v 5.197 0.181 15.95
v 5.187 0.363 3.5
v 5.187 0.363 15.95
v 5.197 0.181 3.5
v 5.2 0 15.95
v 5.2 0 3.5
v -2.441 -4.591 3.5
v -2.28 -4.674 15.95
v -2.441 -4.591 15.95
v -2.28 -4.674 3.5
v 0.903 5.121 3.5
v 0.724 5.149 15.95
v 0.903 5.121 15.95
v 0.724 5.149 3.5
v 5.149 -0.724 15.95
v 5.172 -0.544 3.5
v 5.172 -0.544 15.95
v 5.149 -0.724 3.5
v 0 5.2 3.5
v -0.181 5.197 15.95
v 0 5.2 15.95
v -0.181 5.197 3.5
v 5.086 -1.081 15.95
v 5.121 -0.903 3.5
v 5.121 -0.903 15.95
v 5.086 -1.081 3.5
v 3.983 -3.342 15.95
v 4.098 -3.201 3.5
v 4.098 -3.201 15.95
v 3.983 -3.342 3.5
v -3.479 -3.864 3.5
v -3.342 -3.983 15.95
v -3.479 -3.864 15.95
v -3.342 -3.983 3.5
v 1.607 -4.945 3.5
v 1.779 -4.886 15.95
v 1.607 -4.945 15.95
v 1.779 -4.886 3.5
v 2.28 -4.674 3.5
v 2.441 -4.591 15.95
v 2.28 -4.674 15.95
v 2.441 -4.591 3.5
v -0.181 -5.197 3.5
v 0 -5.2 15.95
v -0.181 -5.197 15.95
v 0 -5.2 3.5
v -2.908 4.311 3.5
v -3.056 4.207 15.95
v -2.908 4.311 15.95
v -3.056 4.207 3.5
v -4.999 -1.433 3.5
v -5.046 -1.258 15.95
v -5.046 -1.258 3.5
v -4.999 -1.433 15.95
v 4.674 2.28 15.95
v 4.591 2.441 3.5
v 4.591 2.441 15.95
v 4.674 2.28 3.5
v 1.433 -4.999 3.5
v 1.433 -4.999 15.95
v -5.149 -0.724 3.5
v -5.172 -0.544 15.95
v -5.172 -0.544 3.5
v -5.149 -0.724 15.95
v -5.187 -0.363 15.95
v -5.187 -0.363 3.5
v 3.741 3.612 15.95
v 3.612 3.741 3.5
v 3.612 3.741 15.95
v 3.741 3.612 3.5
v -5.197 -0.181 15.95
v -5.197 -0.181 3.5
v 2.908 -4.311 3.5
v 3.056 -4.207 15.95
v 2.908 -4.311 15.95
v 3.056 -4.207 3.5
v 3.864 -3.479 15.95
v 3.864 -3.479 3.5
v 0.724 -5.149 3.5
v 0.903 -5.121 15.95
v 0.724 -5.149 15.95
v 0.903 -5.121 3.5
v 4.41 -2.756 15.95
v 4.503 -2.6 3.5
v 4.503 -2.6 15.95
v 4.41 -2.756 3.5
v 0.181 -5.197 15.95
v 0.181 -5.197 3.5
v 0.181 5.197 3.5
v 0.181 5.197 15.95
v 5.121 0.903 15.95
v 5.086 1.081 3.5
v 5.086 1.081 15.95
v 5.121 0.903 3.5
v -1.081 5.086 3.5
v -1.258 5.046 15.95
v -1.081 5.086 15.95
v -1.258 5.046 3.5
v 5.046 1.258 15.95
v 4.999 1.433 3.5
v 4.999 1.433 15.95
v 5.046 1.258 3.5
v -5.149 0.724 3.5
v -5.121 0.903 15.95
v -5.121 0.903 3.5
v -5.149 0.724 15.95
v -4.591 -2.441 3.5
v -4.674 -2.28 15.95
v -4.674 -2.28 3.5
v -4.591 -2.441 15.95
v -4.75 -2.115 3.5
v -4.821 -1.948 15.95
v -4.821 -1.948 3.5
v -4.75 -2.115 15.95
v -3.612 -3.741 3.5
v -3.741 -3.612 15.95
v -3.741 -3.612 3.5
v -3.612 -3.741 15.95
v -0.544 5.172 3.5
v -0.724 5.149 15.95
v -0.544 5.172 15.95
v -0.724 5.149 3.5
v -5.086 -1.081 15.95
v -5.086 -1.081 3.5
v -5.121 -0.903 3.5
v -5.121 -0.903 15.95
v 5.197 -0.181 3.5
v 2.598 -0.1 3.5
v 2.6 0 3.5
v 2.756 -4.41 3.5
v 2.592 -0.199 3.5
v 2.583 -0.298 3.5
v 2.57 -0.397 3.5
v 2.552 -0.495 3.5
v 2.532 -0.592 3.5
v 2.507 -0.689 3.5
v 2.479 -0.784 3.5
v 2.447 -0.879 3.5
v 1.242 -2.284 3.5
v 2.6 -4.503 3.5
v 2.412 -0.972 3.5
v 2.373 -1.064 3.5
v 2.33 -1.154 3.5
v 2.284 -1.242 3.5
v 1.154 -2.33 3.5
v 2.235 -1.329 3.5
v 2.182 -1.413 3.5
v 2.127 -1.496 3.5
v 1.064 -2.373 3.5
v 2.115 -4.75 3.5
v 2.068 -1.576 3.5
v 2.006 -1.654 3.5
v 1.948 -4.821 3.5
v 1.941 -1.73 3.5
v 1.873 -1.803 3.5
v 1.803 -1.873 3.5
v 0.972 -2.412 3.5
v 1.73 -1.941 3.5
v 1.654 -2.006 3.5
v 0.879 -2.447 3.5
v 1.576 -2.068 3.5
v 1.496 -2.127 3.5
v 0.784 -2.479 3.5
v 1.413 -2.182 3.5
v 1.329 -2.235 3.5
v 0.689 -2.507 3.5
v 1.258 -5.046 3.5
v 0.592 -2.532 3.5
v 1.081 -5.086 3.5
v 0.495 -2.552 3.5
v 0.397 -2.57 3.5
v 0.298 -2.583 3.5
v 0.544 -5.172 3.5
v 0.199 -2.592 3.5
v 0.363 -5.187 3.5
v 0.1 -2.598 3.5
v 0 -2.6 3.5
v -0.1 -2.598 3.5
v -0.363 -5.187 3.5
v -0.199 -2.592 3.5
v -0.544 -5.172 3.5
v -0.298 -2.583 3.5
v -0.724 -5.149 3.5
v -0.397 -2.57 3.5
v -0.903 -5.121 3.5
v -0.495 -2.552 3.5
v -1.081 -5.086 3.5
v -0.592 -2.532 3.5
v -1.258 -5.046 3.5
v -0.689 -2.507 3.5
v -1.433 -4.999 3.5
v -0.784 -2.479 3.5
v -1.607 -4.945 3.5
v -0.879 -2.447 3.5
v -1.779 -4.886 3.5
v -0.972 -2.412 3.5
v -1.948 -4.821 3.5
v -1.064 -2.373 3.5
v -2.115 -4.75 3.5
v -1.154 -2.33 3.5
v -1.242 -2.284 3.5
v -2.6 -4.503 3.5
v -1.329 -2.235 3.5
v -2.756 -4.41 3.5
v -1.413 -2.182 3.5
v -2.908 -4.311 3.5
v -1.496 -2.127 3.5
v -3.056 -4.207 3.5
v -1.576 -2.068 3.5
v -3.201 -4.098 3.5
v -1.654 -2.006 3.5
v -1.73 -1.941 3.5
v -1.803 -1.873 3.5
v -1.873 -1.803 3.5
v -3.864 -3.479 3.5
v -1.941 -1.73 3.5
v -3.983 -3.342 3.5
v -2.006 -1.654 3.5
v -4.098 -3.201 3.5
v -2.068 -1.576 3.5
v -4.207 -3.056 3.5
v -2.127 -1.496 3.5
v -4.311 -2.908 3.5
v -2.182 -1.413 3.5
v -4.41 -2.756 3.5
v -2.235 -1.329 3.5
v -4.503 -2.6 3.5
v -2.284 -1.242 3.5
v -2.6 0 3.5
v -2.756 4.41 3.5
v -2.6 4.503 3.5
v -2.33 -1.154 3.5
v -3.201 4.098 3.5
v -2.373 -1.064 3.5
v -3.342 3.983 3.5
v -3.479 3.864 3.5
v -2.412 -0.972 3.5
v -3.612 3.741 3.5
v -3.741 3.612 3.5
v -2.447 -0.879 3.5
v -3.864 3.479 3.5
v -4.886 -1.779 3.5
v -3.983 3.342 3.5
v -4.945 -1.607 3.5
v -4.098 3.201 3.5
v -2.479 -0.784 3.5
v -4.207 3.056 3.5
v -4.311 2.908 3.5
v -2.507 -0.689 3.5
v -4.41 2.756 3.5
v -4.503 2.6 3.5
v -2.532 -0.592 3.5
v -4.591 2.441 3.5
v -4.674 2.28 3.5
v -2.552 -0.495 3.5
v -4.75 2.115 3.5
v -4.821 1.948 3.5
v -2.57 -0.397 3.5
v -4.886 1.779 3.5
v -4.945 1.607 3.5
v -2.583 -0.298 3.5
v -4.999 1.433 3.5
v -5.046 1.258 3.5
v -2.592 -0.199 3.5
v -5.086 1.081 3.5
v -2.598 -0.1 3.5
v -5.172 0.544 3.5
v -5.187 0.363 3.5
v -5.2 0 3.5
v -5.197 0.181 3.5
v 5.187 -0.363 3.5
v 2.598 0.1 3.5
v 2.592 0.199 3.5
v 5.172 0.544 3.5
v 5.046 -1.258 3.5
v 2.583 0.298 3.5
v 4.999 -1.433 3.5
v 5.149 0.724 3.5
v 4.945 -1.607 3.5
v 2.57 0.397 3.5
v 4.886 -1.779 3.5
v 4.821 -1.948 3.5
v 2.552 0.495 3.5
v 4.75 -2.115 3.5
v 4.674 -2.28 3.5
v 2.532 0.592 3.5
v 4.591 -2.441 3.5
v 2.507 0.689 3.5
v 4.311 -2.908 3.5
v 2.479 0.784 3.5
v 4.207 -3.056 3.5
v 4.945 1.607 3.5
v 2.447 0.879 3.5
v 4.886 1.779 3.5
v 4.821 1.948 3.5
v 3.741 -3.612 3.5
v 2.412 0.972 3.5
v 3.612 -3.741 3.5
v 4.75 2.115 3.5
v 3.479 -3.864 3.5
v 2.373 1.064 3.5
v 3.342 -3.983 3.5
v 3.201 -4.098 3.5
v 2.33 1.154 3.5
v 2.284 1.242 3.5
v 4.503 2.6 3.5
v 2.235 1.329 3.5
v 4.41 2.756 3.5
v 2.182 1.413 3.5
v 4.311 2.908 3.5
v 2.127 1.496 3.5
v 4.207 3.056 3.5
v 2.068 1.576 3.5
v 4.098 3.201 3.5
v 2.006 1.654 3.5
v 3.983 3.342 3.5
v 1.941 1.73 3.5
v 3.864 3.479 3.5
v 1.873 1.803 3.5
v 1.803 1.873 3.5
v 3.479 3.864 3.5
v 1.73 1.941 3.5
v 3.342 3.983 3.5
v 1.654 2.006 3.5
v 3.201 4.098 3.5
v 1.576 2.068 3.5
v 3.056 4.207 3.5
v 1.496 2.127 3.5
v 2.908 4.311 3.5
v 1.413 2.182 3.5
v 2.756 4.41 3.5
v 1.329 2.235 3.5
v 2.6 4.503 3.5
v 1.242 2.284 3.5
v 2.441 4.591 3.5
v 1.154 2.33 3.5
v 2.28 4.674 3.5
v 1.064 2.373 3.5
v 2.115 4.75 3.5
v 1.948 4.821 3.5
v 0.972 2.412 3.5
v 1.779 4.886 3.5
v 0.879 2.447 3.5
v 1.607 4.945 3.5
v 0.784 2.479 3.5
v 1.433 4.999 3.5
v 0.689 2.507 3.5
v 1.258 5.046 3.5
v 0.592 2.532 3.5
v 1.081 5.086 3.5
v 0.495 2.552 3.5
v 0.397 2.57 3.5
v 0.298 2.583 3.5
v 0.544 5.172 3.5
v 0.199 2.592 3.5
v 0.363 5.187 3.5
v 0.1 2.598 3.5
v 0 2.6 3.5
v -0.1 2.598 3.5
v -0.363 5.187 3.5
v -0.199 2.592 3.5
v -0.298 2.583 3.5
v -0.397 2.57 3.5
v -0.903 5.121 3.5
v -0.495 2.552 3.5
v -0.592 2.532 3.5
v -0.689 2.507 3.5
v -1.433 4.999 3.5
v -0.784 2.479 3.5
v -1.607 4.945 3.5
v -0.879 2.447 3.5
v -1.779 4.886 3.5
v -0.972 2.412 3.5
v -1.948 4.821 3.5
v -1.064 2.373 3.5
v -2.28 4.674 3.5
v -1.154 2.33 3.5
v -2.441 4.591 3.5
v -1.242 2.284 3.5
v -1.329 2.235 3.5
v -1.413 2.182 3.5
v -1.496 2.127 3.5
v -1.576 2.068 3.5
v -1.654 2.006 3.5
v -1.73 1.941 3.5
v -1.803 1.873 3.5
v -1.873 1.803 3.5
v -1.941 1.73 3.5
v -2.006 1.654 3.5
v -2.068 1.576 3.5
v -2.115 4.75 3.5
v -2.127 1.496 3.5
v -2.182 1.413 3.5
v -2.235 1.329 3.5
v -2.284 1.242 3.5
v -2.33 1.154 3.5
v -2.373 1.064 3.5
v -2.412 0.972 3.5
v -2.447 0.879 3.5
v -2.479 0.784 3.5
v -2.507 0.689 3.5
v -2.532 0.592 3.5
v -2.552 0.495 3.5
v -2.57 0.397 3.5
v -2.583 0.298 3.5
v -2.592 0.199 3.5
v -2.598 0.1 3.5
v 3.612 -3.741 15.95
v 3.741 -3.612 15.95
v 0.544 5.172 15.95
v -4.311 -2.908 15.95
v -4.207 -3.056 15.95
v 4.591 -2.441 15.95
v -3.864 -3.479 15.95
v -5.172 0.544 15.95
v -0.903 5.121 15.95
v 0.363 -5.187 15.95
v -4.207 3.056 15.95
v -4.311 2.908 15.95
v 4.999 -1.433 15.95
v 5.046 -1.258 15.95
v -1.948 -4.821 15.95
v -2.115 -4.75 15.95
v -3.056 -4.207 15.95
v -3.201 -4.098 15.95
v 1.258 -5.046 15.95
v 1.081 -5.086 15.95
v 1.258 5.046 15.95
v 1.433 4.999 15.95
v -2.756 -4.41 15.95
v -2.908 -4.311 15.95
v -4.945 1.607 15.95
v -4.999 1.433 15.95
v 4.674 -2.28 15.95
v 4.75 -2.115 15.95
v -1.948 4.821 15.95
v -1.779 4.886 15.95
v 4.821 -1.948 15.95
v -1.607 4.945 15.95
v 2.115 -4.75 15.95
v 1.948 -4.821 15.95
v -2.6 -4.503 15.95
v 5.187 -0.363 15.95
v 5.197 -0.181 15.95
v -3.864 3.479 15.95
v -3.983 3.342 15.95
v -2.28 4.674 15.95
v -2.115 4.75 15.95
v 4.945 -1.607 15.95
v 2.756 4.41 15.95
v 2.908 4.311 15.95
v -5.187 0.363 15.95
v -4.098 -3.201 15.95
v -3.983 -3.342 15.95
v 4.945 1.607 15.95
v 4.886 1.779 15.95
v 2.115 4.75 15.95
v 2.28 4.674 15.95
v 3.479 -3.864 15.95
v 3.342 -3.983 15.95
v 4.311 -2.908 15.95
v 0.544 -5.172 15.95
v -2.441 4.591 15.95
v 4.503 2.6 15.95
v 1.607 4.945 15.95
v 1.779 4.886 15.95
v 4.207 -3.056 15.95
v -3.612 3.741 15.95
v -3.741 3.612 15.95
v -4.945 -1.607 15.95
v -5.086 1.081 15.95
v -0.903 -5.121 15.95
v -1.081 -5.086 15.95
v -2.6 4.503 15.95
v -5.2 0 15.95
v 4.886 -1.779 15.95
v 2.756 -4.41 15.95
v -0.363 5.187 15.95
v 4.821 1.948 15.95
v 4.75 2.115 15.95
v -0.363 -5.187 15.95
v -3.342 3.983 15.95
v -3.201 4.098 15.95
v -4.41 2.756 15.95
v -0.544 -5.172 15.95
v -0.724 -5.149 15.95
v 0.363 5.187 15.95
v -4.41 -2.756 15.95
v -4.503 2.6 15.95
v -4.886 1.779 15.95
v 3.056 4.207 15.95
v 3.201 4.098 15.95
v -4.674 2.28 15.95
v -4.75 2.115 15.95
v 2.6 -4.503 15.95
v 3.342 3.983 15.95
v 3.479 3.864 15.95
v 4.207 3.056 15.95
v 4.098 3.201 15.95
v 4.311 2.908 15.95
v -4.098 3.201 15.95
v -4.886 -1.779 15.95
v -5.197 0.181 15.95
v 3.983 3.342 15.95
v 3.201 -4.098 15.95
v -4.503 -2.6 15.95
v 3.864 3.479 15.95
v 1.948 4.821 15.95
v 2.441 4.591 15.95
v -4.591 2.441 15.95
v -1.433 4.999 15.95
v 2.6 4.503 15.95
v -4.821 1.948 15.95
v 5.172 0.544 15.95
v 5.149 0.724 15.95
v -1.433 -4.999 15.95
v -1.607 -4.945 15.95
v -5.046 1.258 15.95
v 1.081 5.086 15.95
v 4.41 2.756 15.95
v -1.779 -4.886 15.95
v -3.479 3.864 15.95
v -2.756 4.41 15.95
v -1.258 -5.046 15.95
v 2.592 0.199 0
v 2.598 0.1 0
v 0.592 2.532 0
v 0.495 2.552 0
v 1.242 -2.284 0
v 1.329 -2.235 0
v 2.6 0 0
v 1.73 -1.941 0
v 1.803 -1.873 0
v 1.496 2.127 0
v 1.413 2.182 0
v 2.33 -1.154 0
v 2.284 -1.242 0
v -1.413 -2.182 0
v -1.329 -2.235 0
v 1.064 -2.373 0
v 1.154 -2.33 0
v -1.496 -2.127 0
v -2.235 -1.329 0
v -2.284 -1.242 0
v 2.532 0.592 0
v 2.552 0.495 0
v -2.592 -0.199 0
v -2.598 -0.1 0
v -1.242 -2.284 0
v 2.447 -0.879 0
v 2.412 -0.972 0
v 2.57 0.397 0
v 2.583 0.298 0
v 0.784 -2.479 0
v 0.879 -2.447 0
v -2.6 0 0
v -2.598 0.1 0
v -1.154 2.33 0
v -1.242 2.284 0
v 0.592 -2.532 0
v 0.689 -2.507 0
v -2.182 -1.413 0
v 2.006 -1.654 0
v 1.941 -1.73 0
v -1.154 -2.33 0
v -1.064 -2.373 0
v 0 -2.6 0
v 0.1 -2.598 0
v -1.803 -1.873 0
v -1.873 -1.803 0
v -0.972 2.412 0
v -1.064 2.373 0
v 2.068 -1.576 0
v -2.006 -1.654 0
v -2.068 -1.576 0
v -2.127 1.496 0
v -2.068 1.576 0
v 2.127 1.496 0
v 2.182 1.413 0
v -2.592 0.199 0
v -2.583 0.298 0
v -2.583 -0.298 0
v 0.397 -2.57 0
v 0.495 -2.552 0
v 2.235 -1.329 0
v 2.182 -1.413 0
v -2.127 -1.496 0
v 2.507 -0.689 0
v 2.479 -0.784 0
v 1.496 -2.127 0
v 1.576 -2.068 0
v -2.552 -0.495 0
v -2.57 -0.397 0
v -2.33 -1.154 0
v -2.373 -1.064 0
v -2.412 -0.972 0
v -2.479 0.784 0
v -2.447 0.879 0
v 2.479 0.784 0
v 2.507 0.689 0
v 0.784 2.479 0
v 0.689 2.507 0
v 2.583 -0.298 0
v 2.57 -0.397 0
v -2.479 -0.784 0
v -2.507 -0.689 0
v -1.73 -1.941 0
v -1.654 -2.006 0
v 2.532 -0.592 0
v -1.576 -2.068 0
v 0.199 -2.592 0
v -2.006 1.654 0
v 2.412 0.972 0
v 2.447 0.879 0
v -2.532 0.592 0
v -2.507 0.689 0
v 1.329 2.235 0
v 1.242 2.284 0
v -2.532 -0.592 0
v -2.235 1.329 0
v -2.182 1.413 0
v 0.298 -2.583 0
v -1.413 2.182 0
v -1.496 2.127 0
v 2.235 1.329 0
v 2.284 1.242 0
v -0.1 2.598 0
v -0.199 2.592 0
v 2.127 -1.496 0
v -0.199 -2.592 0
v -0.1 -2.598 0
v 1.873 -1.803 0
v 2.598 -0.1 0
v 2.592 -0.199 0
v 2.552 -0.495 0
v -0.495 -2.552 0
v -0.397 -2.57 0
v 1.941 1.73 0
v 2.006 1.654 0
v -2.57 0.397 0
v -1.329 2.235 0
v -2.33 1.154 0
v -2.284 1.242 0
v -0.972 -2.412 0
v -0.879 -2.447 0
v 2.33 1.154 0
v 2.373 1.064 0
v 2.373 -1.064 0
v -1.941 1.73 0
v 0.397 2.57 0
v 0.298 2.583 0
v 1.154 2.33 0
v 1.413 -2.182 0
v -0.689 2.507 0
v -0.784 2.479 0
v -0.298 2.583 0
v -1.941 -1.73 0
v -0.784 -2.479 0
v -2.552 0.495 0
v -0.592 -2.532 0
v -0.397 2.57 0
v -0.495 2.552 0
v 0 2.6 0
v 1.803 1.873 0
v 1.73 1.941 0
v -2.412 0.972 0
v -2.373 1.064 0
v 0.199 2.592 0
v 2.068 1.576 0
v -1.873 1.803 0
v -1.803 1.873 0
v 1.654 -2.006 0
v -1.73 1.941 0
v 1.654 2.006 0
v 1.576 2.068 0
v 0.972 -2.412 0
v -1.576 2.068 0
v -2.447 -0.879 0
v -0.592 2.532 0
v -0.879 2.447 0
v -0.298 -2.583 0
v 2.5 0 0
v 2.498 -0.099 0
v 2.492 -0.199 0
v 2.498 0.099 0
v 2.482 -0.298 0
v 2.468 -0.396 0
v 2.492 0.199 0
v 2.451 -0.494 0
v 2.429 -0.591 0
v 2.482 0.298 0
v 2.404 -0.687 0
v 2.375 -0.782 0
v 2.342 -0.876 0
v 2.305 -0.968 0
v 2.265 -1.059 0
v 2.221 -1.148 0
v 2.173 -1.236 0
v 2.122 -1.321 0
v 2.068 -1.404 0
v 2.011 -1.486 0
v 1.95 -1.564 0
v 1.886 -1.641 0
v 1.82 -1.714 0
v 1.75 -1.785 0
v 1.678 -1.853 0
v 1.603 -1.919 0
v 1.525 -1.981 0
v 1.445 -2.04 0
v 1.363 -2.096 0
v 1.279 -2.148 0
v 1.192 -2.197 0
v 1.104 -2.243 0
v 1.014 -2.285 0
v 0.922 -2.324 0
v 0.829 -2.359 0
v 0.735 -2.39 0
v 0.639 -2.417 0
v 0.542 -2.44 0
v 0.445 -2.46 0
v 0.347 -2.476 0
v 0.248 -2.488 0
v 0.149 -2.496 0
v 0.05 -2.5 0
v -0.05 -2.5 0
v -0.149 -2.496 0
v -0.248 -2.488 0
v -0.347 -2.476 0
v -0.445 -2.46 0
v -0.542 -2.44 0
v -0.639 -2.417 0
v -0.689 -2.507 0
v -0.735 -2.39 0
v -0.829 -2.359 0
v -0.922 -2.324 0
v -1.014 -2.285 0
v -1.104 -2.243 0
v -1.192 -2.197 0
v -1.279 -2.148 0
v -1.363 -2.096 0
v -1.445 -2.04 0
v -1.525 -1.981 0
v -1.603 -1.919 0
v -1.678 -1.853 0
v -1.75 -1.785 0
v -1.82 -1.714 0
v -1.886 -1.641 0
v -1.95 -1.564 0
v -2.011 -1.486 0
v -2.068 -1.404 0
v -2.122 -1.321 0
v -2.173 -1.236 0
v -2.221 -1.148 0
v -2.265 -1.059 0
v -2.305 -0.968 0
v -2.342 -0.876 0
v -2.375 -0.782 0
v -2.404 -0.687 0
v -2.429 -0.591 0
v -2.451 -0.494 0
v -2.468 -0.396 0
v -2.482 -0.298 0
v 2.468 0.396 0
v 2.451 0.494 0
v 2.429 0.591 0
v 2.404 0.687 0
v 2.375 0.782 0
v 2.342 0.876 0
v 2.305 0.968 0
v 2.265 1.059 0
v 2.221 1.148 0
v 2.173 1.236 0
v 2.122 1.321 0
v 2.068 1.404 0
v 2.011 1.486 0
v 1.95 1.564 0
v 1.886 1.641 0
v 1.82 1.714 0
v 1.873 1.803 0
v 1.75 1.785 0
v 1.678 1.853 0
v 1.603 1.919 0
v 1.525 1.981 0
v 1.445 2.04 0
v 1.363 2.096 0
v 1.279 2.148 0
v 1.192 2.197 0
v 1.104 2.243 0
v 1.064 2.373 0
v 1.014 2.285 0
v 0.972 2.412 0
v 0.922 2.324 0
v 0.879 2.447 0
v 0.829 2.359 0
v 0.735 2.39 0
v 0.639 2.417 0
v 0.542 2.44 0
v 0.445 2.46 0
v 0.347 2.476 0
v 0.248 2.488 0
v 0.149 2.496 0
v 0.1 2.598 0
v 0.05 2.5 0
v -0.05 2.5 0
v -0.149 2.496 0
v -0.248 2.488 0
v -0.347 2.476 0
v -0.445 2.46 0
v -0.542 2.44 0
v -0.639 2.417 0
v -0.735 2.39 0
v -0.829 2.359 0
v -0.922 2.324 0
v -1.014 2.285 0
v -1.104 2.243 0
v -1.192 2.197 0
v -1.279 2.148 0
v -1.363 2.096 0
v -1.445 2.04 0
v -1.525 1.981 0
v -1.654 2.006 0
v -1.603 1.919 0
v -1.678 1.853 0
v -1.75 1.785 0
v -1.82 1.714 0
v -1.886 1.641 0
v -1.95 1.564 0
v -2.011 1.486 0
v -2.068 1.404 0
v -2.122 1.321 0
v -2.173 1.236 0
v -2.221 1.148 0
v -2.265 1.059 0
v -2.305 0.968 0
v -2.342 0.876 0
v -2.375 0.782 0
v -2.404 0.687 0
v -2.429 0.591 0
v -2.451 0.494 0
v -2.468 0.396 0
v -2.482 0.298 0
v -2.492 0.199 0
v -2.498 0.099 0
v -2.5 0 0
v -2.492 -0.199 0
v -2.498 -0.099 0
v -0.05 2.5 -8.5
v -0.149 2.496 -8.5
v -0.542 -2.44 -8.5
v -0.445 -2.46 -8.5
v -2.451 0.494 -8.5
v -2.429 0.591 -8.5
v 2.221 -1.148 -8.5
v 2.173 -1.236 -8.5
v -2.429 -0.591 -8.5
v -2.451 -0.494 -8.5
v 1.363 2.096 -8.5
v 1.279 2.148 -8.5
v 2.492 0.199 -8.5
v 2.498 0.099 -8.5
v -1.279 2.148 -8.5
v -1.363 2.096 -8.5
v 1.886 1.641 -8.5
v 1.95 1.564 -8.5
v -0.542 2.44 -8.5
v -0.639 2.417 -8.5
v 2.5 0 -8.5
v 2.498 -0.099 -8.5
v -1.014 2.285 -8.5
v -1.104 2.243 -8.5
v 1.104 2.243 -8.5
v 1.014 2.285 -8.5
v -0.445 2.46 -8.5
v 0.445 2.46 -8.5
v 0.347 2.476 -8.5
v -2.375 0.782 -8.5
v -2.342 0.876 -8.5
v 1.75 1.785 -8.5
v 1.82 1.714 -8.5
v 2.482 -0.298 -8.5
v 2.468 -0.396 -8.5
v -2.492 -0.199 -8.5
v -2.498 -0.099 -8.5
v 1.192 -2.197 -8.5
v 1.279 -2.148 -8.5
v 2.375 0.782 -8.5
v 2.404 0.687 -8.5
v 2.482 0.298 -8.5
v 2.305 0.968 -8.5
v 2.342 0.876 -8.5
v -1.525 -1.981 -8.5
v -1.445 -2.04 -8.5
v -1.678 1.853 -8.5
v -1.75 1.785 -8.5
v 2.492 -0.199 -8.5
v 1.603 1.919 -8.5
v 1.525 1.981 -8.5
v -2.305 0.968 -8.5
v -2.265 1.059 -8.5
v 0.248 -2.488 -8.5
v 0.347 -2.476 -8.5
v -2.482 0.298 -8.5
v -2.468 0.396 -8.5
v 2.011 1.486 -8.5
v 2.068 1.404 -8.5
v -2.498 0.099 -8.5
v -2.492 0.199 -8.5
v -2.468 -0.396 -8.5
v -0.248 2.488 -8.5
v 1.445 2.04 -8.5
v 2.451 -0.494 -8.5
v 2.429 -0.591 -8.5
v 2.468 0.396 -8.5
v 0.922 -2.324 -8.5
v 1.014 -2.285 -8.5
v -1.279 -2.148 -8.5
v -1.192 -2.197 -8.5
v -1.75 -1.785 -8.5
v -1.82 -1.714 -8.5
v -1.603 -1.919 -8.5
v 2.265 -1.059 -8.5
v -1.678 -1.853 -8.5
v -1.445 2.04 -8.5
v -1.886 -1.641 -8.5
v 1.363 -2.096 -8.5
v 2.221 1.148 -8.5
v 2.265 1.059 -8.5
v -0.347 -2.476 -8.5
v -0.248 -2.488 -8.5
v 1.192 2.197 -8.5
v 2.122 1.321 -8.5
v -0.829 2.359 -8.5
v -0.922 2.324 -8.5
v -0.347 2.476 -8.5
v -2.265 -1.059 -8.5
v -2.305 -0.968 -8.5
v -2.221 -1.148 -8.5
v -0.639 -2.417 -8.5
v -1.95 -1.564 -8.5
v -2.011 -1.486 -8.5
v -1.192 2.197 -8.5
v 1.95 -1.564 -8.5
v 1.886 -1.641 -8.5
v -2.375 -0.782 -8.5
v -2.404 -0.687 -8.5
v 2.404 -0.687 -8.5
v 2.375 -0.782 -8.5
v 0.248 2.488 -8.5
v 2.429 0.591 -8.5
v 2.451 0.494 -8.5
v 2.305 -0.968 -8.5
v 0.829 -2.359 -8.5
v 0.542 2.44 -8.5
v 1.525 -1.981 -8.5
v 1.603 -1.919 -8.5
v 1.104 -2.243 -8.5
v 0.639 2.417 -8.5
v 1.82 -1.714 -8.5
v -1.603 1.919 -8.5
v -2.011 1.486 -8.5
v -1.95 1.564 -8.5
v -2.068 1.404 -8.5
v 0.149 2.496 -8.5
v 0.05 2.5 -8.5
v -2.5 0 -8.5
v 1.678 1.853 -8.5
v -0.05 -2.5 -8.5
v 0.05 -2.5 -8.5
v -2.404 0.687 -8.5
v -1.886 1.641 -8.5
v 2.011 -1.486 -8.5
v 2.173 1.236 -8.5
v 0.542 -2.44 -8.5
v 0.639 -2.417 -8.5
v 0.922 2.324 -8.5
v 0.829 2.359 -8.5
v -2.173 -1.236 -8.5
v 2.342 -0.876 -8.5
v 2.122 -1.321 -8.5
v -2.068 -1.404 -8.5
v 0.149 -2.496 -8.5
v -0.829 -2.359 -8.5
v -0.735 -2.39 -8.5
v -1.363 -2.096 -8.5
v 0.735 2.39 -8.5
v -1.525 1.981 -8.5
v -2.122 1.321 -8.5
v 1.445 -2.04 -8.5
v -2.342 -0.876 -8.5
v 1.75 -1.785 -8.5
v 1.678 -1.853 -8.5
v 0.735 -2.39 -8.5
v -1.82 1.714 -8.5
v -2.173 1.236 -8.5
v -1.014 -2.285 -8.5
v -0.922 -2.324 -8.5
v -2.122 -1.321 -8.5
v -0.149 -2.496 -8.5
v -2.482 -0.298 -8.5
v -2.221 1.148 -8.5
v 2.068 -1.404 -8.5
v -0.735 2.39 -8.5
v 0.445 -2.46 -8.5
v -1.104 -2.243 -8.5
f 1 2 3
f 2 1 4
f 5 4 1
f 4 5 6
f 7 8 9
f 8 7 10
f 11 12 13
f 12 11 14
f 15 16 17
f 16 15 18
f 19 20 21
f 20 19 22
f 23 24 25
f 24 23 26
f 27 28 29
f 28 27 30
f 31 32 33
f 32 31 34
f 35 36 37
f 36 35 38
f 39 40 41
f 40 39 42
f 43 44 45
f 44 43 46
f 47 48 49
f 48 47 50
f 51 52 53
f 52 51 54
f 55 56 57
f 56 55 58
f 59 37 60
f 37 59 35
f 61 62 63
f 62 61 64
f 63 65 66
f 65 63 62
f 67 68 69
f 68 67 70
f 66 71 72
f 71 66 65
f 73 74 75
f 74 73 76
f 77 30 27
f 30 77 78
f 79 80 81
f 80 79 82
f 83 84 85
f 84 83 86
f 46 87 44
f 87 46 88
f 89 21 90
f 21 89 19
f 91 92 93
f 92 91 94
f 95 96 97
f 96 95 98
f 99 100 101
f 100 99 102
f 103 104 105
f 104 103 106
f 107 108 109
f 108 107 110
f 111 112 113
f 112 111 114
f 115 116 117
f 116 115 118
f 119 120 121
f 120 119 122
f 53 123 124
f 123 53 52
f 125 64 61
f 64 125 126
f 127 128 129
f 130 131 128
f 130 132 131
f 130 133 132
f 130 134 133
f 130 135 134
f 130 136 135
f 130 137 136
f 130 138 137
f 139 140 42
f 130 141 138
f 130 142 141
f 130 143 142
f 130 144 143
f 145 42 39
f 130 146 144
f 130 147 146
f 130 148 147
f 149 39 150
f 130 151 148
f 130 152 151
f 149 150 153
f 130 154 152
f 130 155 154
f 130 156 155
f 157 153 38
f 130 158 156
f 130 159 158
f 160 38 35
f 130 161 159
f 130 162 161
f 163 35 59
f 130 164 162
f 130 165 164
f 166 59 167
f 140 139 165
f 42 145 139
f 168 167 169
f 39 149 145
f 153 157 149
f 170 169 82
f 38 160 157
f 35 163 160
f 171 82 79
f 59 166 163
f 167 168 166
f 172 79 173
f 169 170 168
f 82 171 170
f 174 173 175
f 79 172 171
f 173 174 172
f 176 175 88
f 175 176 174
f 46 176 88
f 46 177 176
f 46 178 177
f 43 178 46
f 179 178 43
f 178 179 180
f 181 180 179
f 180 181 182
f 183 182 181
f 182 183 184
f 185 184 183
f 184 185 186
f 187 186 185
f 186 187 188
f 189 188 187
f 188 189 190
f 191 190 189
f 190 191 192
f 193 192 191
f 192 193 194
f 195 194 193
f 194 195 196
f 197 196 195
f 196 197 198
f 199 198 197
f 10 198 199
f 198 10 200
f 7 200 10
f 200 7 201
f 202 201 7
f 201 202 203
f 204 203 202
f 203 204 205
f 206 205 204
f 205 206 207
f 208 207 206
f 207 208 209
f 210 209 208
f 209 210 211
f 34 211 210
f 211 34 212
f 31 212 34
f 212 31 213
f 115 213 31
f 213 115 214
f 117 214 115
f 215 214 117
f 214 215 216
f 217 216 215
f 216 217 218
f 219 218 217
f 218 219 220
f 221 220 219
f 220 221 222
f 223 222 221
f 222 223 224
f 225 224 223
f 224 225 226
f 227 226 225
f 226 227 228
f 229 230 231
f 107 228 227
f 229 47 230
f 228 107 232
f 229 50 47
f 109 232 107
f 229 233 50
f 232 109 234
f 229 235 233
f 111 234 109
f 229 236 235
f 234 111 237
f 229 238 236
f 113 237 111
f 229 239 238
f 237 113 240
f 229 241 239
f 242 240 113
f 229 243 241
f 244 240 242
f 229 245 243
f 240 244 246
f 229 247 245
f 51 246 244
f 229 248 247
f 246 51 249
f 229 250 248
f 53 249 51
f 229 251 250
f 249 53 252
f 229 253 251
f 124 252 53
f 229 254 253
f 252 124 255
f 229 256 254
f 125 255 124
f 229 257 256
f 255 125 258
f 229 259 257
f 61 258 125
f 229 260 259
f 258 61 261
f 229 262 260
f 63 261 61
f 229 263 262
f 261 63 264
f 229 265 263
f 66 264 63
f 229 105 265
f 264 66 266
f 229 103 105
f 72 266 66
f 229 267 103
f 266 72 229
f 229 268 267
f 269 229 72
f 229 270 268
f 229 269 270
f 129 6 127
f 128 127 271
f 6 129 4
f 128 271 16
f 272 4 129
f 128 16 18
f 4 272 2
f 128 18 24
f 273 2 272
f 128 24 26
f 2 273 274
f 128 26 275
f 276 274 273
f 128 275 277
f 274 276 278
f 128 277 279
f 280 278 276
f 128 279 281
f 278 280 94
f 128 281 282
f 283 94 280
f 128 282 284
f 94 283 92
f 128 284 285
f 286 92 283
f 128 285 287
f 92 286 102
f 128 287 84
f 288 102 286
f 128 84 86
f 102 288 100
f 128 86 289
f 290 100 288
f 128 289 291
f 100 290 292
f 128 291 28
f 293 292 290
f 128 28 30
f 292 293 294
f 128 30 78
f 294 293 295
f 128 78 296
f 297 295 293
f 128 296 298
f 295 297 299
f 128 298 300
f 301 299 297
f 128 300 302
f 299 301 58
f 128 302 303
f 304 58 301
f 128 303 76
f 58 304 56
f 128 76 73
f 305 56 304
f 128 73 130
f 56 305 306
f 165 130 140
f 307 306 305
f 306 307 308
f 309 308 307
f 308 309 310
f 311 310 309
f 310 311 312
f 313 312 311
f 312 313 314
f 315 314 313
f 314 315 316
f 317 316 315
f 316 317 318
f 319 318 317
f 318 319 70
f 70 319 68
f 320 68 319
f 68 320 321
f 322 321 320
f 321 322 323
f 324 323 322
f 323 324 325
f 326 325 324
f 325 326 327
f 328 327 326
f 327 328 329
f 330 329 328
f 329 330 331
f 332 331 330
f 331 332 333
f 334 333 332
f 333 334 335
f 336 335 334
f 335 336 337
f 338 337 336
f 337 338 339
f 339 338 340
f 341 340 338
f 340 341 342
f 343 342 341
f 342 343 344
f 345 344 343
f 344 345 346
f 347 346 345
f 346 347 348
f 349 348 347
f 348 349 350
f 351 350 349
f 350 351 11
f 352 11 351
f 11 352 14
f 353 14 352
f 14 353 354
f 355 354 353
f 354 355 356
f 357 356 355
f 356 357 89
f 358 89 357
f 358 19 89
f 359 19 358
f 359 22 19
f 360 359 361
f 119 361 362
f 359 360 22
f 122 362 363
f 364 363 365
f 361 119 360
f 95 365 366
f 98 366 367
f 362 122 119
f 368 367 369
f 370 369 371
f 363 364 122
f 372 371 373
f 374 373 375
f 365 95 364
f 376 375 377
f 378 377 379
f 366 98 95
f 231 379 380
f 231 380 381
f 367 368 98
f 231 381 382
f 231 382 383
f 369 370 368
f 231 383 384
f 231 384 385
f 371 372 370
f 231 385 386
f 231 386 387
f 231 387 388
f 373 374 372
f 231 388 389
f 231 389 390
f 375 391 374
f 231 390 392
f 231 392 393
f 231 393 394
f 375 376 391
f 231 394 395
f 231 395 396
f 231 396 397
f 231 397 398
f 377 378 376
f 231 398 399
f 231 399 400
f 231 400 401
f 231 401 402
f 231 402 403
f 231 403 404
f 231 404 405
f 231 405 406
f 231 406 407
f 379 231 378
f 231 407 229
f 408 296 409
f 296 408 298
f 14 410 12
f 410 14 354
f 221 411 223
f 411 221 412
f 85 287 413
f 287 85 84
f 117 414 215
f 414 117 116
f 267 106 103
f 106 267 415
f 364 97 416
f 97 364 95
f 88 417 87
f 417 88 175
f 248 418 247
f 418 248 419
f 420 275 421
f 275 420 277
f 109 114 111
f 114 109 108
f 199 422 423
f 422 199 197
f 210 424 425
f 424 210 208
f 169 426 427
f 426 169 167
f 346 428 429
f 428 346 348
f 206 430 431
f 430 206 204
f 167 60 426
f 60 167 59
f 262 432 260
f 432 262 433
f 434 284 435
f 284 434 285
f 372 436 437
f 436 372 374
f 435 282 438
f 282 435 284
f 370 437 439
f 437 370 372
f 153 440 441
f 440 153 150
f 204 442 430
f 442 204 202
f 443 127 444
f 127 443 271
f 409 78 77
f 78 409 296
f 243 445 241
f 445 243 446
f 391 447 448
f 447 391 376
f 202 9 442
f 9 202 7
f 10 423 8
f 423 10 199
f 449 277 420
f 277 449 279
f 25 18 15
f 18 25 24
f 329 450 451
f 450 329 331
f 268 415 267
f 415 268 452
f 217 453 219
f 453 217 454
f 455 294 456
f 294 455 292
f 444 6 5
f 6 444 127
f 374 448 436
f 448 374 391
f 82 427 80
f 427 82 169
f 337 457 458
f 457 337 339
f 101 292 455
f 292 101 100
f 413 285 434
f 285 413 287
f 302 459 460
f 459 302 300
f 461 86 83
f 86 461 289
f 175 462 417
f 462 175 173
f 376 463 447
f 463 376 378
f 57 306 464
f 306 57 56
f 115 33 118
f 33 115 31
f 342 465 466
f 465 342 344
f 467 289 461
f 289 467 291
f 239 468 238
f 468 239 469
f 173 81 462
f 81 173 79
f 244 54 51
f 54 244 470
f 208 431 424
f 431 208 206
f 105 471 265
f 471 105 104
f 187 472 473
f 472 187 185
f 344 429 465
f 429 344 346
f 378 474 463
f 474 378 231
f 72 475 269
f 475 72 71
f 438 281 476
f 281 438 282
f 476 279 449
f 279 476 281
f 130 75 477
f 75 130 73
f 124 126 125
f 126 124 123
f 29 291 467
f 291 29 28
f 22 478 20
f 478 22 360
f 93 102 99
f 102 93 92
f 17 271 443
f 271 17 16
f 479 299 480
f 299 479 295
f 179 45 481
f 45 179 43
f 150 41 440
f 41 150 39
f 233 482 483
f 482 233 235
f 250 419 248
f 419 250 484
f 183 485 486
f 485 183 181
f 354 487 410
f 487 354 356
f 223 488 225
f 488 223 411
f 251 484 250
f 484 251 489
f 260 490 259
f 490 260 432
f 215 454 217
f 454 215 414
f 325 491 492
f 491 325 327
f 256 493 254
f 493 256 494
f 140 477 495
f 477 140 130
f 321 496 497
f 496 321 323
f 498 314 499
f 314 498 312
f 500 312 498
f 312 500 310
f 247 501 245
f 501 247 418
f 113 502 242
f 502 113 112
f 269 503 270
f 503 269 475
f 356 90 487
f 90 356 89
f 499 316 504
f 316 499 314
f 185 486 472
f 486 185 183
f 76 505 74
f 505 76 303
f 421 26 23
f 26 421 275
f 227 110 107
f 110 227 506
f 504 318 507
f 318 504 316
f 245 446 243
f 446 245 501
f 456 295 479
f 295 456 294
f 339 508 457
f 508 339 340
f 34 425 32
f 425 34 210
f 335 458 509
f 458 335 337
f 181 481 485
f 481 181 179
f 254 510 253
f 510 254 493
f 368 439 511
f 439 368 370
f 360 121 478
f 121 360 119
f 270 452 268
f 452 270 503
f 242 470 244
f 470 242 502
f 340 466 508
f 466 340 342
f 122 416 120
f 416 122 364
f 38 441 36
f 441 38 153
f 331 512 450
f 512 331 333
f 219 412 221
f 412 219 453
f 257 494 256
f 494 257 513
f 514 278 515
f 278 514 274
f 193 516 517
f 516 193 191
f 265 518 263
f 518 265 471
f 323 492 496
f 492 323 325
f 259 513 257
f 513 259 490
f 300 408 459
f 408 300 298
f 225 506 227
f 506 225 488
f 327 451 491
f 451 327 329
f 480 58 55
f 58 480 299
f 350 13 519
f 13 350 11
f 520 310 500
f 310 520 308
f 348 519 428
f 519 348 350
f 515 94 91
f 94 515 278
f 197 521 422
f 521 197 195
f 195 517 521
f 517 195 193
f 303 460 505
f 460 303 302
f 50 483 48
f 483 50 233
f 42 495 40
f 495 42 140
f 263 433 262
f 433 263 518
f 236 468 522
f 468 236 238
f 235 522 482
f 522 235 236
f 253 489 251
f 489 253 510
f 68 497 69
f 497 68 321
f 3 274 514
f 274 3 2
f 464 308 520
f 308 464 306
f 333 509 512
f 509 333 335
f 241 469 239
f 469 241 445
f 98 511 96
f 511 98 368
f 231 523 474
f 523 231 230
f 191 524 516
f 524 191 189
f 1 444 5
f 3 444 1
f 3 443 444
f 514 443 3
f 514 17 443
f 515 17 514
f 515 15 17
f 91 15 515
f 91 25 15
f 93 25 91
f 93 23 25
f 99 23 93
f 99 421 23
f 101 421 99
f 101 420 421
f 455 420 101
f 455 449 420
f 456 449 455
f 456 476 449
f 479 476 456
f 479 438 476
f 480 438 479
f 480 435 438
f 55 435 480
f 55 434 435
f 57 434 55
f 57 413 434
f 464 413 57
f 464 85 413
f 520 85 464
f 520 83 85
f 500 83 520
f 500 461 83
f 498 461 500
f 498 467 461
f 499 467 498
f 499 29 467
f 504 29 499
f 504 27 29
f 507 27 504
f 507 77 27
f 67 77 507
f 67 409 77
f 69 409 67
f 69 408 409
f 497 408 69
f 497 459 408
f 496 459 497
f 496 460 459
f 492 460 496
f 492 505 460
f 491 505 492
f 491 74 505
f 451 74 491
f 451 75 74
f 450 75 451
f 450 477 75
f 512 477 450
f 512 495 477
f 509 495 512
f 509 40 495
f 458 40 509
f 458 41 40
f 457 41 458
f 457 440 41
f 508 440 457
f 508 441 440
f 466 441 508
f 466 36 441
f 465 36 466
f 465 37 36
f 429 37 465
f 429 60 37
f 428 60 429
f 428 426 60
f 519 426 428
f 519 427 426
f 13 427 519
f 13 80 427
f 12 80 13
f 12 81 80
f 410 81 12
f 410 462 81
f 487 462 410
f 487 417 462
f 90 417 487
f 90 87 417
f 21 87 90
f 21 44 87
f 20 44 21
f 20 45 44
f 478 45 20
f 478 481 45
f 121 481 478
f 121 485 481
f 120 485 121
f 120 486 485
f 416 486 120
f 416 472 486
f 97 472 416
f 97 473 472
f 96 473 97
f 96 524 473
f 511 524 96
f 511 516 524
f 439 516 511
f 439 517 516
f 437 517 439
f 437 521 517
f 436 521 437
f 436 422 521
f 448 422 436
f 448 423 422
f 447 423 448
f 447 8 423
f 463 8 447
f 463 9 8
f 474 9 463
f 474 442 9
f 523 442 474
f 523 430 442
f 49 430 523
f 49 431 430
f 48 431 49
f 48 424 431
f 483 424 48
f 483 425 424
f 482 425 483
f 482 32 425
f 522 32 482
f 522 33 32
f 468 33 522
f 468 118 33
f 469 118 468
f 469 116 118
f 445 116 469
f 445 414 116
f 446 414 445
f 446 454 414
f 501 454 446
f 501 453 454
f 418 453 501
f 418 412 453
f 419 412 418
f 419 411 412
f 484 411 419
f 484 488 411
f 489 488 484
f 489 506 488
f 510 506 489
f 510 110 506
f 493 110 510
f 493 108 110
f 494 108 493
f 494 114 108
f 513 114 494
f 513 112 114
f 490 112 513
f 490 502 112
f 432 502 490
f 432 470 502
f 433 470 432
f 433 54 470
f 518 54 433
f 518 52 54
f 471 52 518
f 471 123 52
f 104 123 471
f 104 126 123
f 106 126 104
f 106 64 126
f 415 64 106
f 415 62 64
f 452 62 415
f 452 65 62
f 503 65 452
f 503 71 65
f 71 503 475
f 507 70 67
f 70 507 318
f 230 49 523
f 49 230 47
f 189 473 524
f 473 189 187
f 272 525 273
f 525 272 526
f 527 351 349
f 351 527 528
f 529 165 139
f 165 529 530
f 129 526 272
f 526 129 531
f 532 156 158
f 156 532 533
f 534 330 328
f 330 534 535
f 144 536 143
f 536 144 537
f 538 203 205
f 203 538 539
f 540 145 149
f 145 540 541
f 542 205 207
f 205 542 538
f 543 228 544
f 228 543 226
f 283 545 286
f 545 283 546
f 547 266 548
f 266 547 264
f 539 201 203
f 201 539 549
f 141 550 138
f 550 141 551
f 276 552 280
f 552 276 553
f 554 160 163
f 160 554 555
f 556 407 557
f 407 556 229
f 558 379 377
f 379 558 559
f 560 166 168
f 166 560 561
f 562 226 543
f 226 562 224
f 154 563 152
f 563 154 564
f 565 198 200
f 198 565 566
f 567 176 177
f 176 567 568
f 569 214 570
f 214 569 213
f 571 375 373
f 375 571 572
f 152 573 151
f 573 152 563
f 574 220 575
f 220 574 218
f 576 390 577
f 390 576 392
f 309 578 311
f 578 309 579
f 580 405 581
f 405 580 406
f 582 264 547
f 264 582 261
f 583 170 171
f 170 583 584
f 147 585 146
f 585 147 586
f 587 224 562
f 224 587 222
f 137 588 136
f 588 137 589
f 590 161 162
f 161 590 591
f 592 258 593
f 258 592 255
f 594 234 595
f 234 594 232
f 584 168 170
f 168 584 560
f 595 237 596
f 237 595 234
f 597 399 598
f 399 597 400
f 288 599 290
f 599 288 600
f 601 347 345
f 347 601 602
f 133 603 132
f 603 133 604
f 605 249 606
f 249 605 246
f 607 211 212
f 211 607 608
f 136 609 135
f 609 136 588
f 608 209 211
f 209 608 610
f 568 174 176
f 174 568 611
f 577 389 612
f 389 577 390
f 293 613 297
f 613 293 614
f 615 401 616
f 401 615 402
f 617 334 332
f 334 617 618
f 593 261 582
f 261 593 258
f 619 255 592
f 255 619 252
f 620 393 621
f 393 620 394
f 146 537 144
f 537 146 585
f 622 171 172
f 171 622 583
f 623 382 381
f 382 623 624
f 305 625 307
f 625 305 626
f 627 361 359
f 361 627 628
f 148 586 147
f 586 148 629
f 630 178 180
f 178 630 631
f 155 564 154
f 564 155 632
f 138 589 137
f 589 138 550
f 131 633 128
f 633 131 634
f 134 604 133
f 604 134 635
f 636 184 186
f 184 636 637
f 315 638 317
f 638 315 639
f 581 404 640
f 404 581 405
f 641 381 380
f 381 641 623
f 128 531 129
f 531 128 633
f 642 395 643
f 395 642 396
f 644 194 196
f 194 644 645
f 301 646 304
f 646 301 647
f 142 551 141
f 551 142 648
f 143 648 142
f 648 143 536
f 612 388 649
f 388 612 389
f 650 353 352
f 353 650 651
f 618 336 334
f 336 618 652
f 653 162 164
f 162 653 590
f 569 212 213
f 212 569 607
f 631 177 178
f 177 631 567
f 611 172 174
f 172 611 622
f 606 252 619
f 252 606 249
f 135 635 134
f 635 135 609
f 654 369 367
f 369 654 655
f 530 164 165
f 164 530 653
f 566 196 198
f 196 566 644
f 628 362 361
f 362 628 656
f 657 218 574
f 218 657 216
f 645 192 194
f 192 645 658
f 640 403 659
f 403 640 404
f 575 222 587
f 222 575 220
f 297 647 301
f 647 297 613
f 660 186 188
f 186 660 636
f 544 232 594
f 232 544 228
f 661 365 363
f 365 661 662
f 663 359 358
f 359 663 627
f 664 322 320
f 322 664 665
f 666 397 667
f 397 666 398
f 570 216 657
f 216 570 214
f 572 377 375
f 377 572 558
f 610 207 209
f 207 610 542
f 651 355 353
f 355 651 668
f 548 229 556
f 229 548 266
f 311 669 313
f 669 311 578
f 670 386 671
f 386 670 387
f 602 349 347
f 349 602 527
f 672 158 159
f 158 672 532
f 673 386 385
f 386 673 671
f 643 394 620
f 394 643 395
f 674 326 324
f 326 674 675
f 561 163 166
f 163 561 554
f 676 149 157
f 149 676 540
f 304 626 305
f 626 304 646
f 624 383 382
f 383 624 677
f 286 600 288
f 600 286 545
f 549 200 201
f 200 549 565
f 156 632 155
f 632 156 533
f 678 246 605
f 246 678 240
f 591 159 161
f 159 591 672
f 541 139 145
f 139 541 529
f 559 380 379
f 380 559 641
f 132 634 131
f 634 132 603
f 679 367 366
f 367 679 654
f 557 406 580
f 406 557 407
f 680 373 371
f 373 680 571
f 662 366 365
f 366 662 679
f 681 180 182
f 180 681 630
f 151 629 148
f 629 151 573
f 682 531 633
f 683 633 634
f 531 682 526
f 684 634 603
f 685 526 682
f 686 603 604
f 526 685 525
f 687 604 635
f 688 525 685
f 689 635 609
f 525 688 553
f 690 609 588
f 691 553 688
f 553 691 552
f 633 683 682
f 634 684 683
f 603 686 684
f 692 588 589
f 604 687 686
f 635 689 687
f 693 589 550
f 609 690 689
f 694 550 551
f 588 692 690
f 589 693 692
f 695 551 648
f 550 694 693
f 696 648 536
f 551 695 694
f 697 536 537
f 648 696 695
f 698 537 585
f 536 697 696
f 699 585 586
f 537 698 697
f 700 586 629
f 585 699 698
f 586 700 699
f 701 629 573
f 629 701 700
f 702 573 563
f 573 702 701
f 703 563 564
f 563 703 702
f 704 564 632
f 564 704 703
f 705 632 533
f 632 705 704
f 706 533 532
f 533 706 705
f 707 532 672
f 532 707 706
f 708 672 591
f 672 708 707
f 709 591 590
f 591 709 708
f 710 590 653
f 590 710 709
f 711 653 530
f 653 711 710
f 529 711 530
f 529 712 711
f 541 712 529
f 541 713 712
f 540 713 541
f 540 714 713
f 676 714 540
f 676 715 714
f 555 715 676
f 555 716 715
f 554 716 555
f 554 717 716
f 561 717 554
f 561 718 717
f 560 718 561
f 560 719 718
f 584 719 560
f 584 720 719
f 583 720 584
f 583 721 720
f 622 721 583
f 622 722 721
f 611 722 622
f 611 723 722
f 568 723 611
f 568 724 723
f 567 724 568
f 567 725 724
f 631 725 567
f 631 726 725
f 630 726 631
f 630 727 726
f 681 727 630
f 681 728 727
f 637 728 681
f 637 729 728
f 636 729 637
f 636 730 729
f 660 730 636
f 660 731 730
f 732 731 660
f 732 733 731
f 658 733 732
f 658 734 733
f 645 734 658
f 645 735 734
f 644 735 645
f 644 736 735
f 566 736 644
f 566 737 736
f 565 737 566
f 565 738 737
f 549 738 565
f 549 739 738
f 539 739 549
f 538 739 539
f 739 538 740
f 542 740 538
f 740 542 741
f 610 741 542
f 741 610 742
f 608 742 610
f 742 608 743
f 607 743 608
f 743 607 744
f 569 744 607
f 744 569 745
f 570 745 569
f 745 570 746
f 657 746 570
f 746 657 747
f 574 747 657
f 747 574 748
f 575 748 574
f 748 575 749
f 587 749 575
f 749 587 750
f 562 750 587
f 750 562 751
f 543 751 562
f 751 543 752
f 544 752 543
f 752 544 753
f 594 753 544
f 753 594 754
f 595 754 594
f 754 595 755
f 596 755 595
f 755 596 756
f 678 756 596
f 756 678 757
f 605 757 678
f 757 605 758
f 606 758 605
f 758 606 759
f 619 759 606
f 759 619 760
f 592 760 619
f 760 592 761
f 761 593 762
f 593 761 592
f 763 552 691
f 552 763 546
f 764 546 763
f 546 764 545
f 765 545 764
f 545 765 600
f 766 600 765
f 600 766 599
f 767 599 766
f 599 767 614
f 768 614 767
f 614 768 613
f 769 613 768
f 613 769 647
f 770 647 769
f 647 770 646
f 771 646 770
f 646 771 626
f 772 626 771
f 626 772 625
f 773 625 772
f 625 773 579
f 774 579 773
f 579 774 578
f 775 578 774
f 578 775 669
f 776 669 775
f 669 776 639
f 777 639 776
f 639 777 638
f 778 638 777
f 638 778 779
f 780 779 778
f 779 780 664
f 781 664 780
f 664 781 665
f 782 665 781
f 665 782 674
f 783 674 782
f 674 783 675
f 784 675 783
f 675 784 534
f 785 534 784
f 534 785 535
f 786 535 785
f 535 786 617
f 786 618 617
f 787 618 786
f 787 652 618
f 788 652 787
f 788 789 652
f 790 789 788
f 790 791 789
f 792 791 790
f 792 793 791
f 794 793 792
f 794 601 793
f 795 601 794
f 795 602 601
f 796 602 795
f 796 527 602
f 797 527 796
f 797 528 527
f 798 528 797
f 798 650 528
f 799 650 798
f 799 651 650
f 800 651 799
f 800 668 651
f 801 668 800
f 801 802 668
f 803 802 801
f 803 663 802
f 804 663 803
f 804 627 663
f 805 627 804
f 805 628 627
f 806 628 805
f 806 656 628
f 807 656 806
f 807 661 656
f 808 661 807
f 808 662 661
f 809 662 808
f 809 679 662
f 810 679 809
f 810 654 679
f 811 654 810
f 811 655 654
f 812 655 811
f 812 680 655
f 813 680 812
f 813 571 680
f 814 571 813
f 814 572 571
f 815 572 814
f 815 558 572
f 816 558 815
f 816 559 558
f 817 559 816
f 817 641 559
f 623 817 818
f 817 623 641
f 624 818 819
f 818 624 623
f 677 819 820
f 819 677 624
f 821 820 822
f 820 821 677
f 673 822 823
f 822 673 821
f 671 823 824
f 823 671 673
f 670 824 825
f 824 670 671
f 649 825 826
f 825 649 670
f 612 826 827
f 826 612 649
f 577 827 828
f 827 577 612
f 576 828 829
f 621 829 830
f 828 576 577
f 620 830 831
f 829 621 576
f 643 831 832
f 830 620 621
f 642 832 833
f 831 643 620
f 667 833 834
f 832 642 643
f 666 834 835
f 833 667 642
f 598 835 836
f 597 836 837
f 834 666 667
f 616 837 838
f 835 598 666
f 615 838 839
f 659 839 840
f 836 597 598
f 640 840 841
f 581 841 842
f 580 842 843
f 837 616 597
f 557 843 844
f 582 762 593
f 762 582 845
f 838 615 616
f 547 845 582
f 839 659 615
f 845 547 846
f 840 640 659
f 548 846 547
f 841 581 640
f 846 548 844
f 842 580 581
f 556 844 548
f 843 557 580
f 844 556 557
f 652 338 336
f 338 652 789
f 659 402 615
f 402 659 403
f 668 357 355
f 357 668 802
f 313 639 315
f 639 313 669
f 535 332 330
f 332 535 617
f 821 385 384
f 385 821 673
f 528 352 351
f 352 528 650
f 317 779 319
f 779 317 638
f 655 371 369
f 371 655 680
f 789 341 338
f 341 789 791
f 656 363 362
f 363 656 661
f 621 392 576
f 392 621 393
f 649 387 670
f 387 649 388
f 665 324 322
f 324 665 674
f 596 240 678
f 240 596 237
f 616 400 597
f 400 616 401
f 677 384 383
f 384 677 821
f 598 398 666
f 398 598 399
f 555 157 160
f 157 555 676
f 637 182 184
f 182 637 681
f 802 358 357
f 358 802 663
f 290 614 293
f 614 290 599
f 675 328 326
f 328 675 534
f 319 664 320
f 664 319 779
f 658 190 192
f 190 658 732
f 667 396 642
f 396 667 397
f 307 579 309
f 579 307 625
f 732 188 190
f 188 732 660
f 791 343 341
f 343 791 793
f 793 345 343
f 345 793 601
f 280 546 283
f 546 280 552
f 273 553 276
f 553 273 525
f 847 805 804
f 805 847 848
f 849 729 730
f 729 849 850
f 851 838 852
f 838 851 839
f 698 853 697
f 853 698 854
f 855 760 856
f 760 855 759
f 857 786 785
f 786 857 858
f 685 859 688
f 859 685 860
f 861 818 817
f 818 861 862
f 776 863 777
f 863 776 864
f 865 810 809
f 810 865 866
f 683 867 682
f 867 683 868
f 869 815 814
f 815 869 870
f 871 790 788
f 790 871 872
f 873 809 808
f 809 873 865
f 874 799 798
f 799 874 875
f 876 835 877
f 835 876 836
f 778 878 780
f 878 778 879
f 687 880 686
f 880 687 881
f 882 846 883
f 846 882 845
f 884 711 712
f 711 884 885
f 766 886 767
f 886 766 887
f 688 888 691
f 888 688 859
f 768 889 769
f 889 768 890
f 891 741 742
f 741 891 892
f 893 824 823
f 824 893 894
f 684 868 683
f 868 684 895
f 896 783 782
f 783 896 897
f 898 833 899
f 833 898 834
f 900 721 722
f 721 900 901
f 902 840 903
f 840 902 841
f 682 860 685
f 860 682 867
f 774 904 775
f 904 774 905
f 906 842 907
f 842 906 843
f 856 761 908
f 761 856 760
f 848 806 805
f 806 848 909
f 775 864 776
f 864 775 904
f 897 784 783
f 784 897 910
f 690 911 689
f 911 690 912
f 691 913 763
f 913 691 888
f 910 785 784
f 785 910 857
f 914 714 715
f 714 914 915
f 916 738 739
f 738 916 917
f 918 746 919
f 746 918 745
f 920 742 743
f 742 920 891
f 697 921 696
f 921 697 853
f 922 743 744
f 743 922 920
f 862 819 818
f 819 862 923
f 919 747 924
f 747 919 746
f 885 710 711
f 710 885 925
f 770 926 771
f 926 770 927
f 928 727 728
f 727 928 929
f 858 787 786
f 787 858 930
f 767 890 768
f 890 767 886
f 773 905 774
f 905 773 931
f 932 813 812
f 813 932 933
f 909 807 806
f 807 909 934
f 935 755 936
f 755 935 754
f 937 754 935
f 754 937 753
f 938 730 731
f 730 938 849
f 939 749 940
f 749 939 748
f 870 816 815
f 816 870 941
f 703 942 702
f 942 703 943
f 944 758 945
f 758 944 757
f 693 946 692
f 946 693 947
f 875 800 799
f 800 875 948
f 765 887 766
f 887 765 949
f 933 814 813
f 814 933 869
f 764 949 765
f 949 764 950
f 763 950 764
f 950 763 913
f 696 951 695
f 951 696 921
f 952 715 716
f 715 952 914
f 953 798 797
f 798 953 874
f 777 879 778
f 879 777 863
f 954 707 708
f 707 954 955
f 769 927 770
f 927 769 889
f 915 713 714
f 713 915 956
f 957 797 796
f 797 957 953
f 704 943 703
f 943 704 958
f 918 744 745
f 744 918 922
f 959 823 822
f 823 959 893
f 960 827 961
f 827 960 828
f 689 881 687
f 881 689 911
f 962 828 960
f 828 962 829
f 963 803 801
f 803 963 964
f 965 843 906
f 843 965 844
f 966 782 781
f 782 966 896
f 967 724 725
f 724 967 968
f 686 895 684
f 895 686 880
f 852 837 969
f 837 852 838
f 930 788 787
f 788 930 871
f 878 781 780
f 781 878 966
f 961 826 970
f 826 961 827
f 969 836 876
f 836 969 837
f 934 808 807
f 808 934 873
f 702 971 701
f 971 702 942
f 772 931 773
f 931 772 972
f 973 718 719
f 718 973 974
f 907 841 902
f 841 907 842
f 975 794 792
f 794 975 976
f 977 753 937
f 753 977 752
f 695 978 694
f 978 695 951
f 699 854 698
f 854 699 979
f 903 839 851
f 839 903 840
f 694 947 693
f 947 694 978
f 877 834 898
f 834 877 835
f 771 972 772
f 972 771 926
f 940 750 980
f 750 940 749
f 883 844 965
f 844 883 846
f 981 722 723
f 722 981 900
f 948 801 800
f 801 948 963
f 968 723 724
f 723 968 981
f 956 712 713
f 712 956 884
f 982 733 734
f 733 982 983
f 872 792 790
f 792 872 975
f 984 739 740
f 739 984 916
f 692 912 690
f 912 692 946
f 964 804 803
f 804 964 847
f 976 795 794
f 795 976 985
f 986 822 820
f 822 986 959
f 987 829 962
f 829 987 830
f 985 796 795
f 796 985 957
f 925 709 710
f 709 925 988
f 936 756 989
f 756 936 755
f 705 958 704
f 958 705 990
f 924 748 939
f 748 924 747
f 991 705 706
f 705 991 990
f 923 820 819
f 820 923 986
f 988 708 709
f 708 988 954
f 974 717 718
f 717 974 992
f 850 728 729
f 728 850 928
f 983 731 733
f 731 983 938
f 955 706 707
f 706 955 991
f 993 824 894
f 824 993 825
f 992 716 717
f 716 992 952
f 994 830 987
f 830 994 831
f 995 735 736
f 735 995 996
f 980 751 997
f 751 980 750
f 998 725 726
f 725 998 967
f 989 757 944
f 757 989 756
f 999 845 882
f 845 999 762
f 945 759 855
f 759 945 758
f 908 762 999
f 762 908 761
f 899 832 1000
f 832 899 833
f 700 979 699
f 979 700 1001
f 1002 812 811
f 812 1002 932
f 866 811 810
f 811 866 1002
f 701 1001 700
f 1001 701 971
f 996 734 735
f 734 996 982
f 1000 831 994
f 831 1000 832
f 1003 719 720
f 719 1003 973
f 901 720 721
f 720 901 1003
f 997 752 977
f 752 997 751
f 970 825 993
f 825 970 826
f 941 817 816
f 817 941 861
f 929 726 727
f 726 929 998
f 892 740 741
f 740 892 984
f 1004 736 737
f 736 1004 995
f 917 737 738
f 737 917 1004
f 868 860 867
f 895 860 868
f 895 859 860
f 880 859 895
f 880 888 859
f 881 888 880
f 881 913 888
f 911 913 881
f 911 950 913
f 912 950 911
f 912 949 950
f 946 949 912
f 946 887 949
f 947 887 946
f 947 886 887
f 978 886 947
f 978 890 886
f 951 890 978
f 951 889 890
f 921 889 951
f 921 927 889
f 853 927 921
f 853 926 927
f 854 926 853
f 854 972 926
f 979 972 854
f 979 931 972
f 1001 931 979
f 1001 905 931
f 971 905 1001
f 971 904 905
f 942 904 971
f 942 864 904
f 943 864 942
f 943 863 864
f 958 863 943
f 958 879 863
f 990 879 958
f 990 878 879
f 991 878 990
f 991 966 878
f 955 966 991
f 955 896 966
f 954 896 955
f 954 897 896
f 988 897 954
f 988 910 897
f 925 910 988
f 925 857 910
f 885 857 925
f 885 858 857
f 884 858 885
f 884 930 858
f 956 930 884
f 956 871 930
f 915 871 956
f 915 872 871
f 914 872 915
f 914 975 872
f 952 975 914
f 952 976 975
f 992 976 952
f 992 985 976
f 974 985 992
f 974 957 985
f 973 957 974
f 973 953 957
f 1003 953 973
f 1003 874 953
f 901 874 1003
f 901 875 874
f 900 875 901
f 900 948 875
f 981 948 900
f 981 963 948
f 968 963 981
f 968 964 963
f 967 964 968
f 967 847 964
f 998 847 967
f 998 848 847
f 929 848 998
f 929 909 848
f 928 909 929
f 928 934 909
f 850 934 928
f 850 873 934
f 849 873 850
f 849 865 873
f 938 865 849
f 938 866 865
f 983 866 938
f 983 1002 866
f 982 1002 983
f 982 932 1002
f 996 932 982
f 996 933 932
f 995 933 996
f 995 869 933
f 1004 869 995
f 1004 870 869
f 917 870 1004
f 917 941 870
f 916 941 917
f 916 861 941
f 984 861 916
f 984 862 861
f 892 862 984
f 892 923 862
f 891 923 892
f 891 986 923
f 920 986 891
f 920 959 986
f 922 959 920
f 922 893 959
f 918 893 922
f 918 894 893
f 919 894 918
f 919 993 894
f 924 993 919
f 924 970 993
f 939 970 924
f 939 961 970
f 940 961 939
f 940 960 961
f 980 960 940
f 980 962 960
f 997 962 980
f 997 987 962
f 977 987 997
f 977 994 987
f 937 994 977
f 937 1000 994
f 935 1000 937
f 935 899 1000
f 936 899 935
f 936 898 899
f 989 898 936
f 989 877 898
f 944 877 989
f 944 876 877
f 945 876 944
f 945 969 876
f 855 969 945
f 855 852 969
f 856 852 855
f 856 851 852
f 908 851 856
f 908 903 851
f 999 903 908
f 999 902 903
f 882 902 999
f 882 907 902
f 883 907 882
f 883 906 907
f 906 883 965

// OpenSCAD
// file: ../hwlookup.scad
/* (Truncated) Imperial + Metric tables
 * searchable by string
 *
 * For quickly setting hardware pocket sizes.
 *
 * Authors:
 * Chris Cannon
 */


// screw sizing format
// ["key", OD_shaft, [OD_wash, H_wash], [ODmin_hex, H_hex], [OD_shc, H_shc], [OD_bhc, H_bhc], [ODmin_squ, H_squ], OD_flathead]
_M2 = ["M2", 2, [5, .3], [4, 1.6], [3.8, 2], [3.5, 1.3], [0, 0], 3.8];
_M2_5 = ["M2.5", 2.5, [6, .5], [5, 2], [4.5, 2.5], [4.7, 1.5], [0, 0], 4.7];
_M3 = ["M3", 3, [7, .5], [5.5, 2.4], [5.5, 3], [5.7, 1.65], [5.5, 2.4], 5.6];
_M4 = ["M4", 4, [9, .8], [7, 3.2], [7, 4], [7.6, 2.2], [7, 3.2], 7.5];
_M5 = ["M5", 5, [10, 1], [8, 3.5], [8.5, 5], [9.5, 2.75], [8, 4], 9.2];
_M6 = ["M6", 6, [12, 1.6], [10, 4.7], [10, 6], [10.5, 3.3], [10, 5], 11];
_M8 = ["M8", 8, [16, 1.6], [13, 6.8], [13, 8], [14, 4.4], [13, 6.5], 14.5];
_I2 = ["I2", 2.18, [6.35, 0.51], [4.78, 1.68], [3.56, 2.18], [0, 0], [0 ,0], 4.37];
_I4 = ["I4", 2.84, [7.92, 0.81], [6.35, 2.49], [4.65, 2.84], [5.41, 1.5], [0, 0], 5.72];
_I6 = ["I6", 3.51, [9.53, 1.24], [7.92, 2.9], [5.74, 3.51], [6.65, 1.85], [0, 0], 7.09];
_I8 = ["I8", 4.17, [11.13, 1.24], [8.74, 3.3], [6.86, 4.17], [7.92, 2.21], [0, 0], 8.43];
_I10 = ["I10", 4.83, [12.7, 1.24], [9.53, 3.3], [7.92, 4.83], [9.17, 2.57], [0, 0], 9.78];
_Iq = ["I1/4", 6.35, [15.88, 1.65], [11.13, 4.9], [9.53, 6.35], [11.1, 3.35], [12.7, 6.35], 0];
HW_IDX = [_M2, _M2_5, _M3, _M4, _M5, _M6, _M8, _I2, _I4, _I6, _I8, _I10, _Iq];

/*for (idx = ["M2", "M2.5", "M3", "M4", "M5", "M6", "M8", "I2", "I4", "I6", "I8", "I1/4"]) {
    I = search([idx], HW_IDX, num_returns_per_match=1);
    spec = HW_IDX[I[0]];
    echo(len(spec), spec);
}*/

function hw_getspec(size) = HW_IDX[(search([size], HW_IDX, num_returns_per_match=1))[0]];

function hw_shaft(spec) = spec[1];

function hw_washer(spec) = spec[2];

function hw_hex(spec) = spec[3];

function hw_shc(spec) = spec[4];

function hw_bhc(spec) = spec[5];

function hw_squ(spec) = spec[6];

function hw_flathead(spec) = spec[7];

function hw_envelope(spec) = 
    [max([for (i=[2:6]) spec[i][0]]),
        max([for (i=[2:6]) spec[i][1]])];
// main file
/*
 * Demo showing all the built in variability
 * of hardware attachment pockets,
 * and how to setup a customizer.
 */

use <../hw_pockets.scad>

// [snug, close, loose, gap]
margins = [.06, .1, .2, .35];

// text like "M2.5", "M4" for metric, "I4", "I1/4" for imperial
size = "M5";

// type of hardware
type = 0; //[0: SHC, 1: BHC, 2: hex, 3: square, 4: tapped, 5: flathead, 6: custom]

// for all
Lshaft = 3.5;

// for all
sink = 6; //.1

// for any except tapped
slot = 0; //.1

// for SHC or BHC
washer = true;

// for hex or square, also the exact bore diameter for custom type
minor_access = 8; //.01

// for hex
major_access = 0; //.1

// for nuts only
capture = true;

// for tapped only
rel_thread = 0.15;

TLshaft = 12;

module _end_cust_() {}

$fa = 2;
$fs = 0.1;

#neg_hardware(size, type, Lshaft, sink=sink, slot=slot, capture=capture, minor_access=minor_access, major_access=major_access, access_draft=12, washer=washer, rel_thread=rel_thread, margins=margins);
vit_hardware(size, type, Lshaft, washer=washer, TLshaft=TLshaft);
